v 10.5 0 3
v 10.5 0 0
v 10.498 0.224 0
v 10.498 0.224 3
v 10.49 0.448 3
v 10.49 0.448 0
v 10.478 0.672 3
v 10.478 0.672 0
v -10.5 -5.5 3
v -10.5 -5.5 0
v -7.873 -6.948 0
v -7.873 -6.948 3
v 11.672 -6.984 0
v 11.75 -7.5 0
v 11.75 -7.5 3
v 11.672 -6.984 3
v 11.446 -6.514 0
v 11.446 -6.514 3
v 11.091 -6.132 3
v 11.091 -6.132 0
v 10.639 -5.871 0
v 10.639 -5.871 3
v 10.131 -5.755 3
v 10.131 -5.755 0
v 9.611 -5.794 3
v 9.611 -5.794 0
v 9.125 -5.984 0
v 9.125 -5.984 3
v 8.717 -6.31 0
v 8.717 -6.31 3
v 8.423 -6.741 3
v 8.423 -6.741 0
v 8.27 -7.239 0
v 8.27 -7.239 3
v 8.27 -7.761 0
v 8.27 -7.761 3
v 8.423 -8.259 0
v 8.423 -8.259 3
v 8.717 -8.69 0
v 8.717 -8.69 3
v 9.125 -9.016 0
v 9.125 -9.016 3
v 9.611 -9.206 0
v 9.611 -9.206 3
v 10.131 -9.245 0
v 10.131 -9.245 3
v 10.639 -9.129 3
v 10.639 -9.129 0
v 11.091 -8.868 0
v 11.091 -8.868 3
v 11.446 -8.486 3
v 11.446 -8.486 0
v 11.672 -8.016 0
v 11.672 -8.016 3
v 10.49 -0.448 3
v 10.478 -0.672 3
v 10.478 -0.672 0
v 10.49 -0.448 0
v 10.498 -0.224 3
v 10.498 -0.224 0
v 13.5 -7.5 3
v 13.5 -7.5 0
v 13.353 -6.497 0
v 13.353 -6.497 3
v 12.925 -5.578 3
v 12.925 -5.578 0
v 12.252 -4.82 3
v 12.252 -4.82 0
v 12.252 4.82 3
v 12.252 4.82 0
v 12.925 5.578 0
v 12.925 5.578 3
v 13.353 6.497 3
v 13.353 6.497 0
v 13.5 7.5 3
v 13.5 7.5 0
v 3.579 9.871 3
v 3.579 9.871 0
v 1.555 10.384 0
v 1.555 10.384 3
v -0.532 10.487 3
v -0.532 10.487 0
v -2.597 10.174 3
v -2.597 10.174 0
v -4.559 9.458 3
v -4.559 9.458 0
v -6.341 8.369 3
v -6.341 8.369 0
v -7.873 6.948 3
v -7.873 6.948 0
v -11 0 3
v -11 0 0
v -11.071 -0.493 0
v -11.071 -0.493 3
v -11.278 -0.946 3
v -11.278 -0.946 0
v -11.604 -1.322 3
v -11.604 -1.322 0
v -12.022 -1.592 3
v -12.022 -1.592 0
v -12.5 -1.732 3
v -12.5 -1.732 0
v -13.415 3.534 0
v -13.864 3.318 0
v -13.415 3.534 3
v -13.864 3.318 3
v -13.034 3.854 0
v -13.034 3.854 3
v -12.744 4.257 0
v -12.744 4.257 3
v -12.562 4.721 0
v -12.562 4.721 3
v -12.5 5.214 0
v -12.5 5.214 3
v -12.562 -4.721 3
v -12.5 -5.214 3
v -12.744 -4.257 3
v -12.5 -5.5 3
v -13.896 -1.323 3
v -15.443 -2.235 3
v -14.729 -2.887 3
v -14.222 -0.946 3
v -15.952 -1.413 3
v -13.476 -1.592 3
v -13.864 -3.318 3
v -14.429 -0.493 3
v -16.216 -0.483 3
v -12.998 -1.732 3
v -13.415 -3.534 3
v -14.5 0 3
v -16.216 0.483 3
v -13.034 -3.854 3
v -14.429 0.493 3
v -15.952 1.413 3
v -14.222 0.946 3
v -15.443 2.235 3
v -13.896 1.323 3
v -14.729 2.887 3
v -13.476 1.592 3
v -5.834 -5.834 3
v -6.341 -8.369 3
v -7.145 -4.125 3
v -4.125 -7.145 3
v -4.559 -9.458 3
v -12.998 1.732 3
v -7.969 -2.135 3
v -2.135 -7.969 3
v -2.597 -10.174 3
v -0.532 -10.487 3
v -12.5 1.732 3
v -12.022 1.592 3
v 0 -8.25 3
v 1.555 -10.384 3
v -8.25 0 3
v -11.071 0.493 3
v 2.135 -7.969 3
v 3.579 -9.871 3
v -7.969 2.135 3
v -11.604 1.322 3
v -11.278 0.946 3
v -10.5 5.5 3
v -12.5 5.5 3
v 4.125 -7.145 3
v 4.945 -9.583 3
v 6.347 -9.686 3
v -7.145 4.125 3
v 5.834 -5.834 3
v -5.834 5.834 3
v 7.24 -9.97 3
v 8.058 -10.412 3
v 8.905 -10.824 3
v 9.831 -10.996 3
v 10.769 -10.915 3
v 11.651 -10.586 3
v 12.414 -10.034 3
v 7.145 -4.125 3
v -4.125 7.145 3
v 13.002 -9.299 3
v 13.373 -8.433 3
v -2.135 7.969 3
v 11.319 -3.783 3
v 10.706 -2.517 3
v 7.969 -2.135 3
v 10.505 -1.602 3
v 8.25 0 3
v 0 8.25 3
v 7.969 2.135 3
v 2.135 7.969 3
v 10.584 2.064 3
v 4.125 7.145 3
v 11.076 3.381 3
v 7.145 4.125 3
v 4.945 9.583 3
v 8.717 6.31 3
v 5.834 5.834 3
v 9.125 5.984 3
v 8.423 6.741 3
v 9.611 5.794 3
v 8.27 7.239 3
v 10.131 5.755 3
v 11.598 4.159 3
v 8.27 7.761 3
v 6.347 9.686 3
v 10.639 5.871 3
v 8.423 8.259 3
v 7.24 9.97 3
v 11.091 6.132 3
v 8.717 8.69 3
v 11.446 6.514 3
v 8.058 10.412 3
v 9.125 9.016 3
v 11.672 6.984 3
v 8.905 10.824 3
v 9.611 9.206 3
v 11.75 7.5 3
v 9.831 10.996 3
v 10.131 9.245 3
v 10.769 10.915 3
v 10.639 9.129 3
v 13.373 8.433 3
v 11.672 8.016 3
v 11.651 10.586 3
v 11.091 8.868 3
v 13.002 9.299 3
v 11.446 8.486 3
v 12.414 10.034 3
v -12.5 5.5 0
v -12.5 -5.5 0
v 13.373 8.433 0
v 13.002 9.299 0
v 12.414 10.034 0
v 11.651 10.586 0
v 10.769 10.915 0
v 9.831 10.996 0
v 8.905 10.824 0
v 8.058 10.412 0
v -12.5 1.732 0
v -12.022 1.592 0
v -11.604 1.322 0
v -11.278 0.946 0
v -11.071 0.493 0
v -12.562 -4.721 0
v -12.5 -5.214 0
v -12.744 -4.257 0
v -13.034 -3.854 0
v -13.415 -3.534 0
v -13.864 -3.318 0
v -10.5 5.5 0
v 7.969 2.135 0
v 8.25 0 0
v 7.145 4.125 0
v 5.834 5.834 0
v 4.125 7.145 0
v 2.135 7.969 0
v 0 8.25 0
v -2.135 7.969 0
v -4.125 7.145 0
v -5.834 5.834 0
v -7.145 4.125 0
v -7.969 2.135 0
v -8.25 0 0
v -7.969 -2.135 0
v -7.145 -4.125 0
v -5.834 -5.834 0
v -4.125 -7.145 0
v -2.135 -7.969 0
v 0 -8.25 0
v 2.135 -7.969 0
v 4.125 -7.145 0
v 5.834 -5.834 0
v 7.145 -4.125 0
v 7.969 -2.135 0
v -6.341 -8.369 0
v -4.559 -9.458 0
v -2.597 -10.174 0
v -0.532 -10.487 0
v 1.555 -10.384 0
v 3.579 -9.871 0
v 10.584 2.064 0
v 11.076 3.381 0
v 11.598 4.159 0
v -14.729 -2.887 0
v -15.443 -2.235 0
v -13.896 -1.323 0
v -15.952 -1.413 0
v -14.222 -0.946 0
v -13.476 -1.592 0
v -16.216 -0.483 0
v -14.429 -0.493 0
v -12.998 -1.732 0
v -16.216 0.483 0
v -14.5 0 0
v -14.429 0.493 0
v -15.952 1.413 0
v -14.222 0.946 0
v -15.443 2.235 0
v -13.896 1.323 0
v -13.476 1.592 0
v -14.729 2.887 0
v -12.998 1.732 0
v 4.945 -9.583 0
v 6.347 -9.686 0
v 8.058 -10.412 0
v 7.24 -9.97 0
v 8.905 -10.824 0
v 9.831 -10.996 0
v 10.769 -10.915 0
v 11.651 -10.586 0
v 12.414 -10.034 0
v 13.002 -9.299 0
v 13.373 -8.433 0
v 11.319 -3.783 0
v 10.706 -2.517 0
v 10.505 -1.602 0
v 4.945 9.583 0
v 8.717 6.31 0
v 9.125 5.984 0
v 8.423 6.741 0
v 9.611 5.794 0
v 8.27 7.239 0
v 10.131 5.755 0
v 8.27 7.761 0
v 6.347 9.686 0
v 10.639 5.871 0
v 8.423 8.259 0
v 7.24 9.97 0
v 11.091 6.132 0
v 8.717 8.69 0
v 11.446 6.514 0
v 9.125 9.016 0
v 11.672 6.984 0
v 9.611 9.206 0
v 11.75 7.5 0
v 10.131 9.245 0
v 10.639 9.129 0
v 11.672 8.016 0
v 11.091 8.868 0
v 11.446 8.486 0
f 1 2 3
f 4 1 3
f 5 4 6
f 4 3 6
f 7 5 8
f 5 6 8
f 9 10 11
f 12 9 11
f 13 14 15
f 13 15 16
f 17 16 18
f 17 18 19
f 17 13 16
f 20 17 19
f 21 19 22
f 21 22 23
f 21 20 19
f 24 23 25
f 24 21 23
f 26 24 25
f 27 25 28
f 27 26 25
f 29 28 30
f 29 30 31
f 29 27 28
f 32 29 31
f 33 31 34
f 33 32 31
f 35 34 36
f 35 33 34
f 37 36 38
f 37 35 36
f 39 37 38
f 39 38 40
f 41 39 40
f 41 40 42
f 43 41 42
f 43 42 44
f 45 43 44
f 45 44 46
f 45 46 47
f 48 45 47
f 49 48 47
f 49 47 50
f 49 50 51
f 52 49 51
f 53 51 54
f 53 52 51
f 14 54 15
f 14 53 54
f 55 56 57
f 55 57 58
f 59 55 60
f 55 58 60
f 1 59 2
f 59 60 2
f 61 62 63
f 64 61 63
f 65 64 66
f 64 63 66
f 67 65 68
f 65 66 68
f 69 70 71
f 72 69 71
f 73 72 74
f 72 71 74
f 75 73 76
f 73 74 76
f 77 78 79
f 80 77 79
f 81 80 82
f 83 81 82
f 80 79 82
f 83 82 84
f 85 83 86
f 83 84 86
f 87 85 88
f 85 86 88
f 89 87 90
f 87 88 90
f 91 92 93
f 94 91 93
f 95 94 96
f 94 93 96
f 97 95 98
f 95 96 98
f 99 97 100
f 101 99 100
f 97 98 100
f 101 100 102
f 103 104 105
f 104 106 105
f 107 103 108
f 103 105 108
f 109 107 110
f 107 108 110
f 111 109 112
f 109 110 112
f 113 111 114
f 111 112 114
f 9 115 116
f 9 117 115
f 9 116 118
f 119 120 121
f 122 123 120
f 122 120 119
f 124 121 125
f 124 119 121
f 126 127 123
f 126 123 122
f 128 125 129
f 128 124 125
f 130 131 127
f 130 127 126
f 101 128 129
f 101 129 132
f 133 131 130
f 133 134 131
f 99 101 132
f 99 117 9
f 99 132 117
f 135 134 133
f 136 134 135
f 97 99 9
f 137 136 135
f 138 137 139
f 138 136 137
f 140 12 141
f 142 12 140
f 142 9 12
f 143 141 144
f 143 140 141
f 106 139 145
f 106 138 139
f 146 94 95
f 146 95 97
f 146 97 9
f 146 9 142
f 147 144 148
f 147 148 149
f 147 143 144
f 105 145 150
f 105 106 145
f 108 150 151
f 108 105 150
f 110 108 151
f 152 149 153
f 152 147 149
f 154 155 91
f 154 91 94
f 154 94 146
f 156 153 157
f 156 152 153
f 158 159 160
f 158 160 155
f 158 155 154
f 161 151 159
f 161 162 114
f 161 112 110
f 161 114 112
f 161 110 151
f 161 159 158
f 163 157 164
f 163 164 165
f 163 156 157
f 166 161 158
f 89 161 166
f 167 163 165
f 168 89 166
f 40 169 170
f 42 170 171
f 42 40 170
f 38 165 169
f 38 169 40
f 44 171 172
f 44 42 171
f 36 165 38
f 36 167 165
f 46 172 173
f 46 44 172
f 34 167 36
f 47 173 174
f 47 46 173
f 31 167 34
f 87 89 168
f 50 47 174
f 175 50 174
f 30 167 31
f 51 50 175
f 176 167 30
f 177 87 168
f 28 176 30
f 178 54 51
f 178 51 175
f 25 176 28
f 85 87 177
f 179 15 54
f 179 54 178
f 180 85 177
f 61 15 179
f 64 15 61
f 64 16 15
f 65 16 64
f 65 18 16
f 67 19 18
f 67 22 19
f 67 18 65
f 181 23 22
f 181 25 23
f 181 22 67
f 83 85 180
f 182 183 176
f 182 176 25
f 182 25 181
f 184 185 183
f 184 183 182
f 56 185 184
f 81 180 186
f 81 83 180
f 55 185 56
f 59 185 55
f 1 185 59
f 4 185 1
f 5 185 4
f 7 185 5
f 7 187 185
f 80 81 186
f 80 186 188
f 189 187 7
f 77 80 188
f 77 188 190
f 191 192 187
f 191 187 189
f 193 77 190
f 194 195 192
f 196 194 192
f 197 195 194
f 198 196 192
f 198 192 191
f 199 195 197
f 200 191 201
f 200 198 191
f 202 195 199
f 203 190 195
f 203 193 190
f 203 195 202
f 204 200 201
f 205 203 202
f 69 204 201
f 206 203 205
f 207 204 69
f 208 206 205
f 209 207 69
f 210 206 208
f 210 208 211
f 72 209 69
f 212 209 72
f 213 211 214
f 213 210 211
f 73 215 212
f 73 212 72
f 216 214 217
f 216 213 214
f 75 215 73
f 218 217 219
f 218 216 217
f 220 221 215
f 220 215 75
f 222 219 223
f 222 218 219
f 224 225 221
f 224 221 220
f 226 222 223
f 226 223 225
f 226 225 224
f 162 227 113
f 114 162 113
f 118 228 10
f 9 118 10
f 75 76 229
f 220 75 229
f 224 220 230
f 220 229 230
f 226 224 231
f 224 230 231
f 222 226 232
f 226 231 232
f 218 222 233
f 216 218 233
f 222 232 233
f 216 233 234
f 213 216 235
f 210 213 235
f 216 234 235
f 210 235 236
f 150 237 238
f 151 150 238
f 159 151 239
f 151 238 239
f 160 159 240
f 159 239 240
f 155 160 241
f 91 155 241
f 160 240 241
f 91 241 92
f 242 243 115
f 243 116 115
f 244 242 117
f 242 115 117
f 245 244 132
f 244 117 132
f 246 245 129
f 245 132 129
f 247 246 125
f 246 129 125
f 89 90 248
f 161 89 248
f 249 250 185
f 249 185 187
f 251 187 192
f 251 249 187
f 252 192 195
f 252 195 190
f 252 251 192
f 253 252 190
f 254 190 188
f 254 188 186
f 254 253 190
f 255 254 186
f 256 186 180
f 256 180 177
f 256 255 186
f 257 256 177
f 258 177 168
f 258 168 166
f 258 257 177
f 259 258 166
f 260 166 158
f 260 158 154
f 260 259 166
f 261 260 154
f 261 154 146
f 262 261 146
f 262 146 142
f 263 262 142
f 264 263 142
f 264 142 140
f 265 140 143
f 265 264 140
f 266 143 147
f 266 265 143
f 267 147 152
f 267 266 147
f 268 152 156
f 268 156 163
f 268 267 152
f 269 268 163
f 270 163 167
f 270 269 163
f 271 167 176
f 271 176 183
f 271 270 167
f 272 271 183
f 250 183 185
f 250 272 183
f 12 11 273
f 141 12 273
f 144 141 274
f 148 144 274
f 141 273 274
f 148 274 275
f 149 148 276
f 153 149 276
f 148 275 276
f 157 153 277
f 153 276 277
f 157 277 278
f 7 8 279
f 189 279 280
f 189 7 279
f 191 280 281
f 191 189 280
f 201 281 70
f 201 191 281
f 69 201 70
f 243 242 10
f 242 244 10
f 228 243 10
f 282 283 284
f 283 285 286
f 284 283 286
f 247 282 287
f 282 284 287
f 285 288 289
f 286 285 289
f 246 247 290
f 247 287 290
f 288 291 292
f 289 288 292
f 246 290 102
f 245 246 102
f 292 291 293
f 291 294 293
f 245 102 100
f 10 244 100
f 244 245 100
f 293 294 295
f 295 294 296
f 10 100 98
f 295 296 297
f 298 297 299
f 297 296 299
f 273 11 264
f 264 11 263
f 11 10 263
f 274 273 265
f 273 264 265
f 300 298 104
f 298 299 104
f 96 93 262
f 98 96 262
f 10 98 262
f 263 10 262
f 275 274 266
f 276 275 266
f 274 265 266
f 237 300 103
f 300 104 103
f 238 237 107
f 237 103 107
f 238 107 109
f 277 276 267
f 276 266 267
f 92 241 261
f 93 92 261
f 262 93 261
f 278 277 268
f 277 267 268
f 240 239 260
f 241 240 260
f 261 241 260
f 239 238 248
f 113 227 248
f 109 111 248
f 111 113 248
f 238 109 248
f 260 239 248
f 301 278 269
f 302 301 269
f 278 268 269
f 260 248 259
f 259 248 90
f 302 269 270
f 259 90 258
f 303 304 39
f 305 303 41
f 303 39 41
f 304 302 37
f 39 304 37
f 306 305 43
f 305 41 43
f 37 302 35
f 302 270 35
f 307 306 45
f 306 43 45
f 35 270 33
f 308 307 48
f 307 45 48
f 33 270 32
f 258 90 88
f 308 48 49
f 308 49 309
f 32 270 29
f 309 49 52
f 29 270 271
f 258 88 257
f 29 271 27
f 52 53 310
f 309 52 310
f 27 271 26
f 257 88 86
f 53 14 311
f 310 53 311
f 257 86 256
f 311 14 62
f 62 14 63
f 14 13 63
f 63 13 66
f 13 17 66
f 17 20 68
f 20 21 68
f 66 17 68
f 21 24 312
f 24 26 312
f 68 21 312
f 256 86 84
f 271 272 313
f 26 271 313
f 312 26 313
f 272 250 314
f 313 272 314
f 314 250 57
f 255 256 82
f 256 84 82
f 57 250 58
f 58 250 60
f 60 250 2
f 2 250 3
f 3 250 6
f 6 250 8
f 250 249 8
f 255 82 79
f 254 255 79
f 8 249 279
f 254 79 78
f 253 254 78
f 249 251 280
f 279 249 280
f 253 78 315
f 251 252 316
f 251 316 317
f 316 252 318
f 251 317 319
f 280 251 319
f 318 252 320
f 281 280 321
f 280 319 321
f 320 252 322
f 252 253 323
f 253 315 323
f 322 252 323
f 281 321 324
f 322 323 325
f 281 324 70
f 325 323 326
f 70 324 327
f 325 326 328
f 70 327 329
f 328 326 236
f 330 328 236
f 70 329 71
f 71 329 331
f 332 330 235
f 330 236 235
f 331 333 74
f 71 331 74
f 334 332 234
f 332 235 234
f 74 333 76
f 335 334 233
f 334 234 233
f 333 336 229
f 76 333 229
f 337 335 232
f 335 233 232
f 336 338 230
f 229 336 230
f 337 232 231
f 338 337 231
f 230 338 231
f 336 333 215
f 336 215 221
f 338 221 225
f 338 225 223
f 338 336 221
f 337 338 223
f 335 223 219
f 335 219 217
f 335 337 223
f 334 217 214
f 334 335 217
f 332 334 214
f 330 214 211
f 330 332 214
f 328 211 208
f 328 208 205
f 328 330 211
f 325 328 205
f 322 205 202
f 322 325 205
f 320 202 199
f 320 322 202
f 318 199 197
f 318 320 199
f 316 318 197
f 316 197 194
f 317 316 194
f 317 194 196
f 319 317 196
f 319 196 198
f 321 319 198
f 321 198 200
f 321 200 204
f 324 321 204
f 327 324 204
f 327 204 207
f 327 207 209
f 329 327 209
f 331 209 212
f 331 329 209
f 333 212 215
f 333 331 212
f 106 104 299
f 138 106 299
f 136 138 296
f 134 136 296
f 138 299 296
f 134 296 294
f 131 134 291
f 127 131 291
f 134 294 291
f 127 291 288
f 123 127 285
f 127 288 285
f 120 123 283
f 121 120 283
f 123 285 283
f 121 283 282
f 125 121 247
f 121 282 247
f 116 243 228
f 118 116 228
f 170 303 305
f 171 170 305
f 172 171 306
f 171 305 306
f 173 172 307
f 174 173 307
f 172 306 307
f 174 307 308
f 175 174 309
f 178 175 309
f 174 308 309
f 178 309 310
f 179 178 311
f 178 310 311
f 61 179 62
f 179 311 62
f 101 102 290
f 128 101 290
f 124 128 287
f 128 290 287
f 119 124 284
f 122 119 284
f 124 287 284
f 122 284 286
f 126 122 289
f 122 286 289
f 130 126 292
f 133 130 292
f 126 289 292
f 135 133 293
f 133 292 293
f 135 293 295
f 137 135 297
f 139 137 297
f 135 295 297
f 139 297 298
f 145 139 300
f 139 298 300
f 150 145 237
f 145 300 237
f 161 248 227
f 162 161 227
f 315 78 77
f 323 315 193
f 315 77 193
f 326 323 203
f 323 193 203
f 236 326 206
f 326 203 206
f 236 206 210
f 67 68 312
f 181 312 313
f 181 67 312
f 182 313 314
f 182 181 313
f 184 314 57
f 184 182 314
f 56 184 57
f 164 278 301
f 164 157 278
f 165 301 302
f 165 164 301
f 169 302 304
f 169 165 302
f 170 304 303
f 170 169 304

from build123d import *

# Parameters (mm, degrees)
F0_R     = 8.25
F0_R_2   = 1.75
F1_DEPTH = 3
F2_R     = 2
F3_R     = 5


# Not quite as in the source:
# - a feature names something its author has since deleted; it is built from what else it names


with BuildPart() as f1:
    # F0 (on Top) → F1 (new body)
    with BuildSketch(Plane.XY):
        with BuildLine():
            Line((-10.5, -2.6809513237), (-10.5, 0))
            Line((-10.5, 0), (-10.5, 2.6809513237))
            ThreePointArc((-10.5, 2.6809513237), (-11.4360102659, 3.243983813), (-12.5, 3.4910600109))
            Line((-12.5, 3.4910600109), (-12.5, 1.7320508076))
            ThreePointArc((-12.5, 1.7320508076), (-11.4271243445, 1.1456439237), (-11, 0))
            ThreePointArc((-11, 0), (-11.4271243445, -1.1456439237), (-12.5, -1.7320508076))
            Line((-12.5, -1.7320508076), (-12.5, -3.4910600109))
            ThreePointArc((-12.5, -3.4910600109), (-11.4360102659, -3.243983813), (-10.5, -2.6809513237))
        make_face()
        with BuildLine():
            Line((-12.5, 1.7320508076), (-12.5, 3.4910600109))
            ThreePointArc((-12.5, 3.4910600109), (-16.25, 0), (-12.5, -3.4910600109))
            Line((-12.5, -3.4910600109), (-12.5, -1.7320508076))
            ThreePointArc((-12.5, -1.7320508076), (-14.5, 0), (-12.5, 1.7320508076))
        make_face()
        with BuildLine():
            Line((-10.5, 2.6809513237), (-10.5, 5.5))
            Line((-10.5, 5.5), (-12.5, 5.5))
            Line((-12.5, 5.5), (-12.5, 3.4910600109))
            ThreePointArc((-12.5, 3.4910600109), (-11.4360102659, 3.243983813), (-10.5, 2.6809513237))
        make_face()
        with BuildLine():
            ThreePointArc((-10.2181372549, 2.4165411314), (-9.3247712996, 4.8268665001), (-7.8725304742, 6.9478963675))
            Line((-7.8725304742, 6.9478963675), (-10.5, 5.5))
            Line((-10.5, 5.5), (-10.5, 2.6809513237))
            ThreePointArc((-10.5, 2.6809513237), (-10.3554163168, 2.5526396111), (-10.2181372549, 2.4165411314))
        make_face()
        with BuildLine():
            Line((-7.2260237528, 5.7746931281), (-7.8725304742, 6.9478963675))
            ThreePointArc((-7.8725304742, 6.9478963675), (-9.3247712996, 4.8268665001), (-10.2181372549, 2.4165411314))
            ThreePointArc((-10.2181372549, 2.4165411314), (-9.5010371187, 1.301629823), (-9.25, 0))
            ThreePointArc((-9.25, 0), (-8.729353347, 3.0595571809), (-7.2260237528, 5.7746931281))
        make_face()
        with BuildLine():
            ThreePointArc((6.6767394005, 6.401847466), (6.5063300085, 7.2895956499), (6.5689658587, 8.1913788551))
            ThreePointArc((6.5689658587, 8.1913788551), (-0.9007676454, 10.4612913949), (-7.8725304742, 6.9478963675))
            Line((-7.8725304742, 6.9478963675), (-7.2260237528, 5.7746931281))
            ThreePointArc((-7.2260237528, 5.7746931281), (-0.4168440545, 9.2406028502), (6.6767394005, 6.401847466))
        make_face()
        with BuildLine():
            ThreePointArc((9.25, 0), (8.9359851316, 2.3897007611), (8.0152605995, 4.617152534))
            ThreePointArc((8.0152605995, 4.617152534), (7.2, 5.4), (6.6767394005, 6.401847466))
            ThreePointArc((6.6767394005, 6.401847466), (-0.4168440545, 9.2406028502), (-7.2260237528, 5.7746931281))
            ThreePointArc((-7.2260237528, 5.7746931281), (-8.729353347, 3.0595571809), (-9.25, 0))
            ThreePointArc((-9.25, 0), (-8.729353347, -3.0595571809), (-7.2260237528, -5.7746931281))
            ThreePointArc((-7.2260237528, -5.7746931281), (-0.4168440545, -9.2406028502), (6.6767394005, -6.401847466))
            ThreePointArc((6.6767394005, -6.401847466), (7.2, -5.4), (8.0152605995, -4.617152534))
            ThreePointArc((8.0152605995, -4.617152534), (8.9359851316, -2.3897007611), (9.25, 0))
        make_face()
        Circle(F0_R, mode=Mode.SUBTRACT)
        with BuildLine():
            Line((-12.5, -5.5), (-10.5, -5.5))
            Line((-10.5, -5.5), (-10.5, -2.6809513237))
            ThreePointArc((-10.5, -2.6809513237), (-11.4360102659, -3.243983813), (-12.5, -3.4910600109))
            Line((-12.5, -3.4910600109), (-12.5, -5.5))
        make_face()
        with BuildLine():
            Line((-10.5, -5.5), (-7.8725304742, -6.9478963675))
            ThreePointArc((-7.8725304742, -6.9478963675), (-9.3247712996, -4.8268665001), (-10.2181372549, -2.4165411314))
            ThreePointArc((-10.2181372549, -2.4165411314), (-10.3554163168, -2.5526396111), (-10.5, -2.6809513237))
            Line((-10.5, -2.6809513237), (-10.5, -5.5))
        make_face()
        with BuildLine():
            ThreePointArc((-10.5, -2.6809513237), (-10.3554163168, -2.5526396111), (-10.2181372549, -2.4165411314))
            ThreePointArc((-10.2181372549, -2.4165411314), (-10.4292962652, -1.2164618415), (-10.5, 0))
            Line((-10.5, 0), (-10.5, -2.6809513237))
        make_face()
        with BuildLine():
            ThreePointArc((-9.25, 0), (-9.5010371187, 1.301629823), (-10.2181372549, 2.4165411314))
            ThreePointArc((-10.2181372549, 2.4165411314), (-10.4292962652, 1.2164618415), (-10.5, 0))
            ThreePointArc((-10.5, 0), (-10.4292962652, -1.2164618415), (-10.2181372549, -2.4165411314))
            ThreePointArc((-10.2181372549, -2.4165411314), (-9.5010371187, -1.301629823), (-9.25, 0))
        make_face()
        with BuildLine():
            ThreePointArc((-10.2181372549, -2.4165411314), (-9.3247712996, -4.8268665001), (-7.8725304742, -6.9478963675))
            Line((-7.8725304742, -6.9478963675), (-7.2260237528, -5.7746931281))
            ThreePointArc((-7.2260237528, -5.7746931281), (-8.729353347, -3.0595571809), (-9.25, 0))
            ThreePointArc((-9.25, 0), (-9.5010371187, -1.301629823), (-10.2181372549, -2.4165411314))
        make_face()
        with BuildLine():
            ThreePointArc((-10.5, 0), (-10.4292962652, 1.2164618415), (-10.2181372549, 2.4165411314))
            ThreePointArc((-10.2181372549, 2.4165411314), (-10.3554163168, 2.5526396111), (-10.5, 2.6809513237))
            Line((-10.5, 2.6809513237), (-10.5, 0))
        make_face()
        with BuildLine():
            ThreePointArc((-7.8725304742, -6.9478963675), (-0.9007676454, -10.4612913949), (6.5689658587, -8.1913788551))
            ThreePointArc((6.5689658587, -8.1913788551), (6.5063300085, -7.2895956499), (6.6767394005, -6.401847466))
            ThreePointArc((6.6767394005, -6.401847466), (-0.4168440545, -9.2406028502), (-7.2260237528, -5.7746931281))
            Line((-7.2260237528, -5.7746931281), (-7.8725304742, -6.9478963675))
        make_face()
        with BuildLine():
            ThreePointArc((6.5689658587, -8.1913788551), (8.4, -6.3), (9.7030341413, -4.0126211449))
            ThreePointArc((9.7030341413, -4.0126211449), (8.8197842263, -4.2049900262), (8.0152605995, -4.617152534))
            ThreePointArc((8.0152605995, -4.617152534), (7.4, -5.55), (6.6767394005, -6.401847466))
            ThreePointArc((6.6767394005, -6.401847466), (6.5063300085, -7.2895956499), (6.5689658587, -8.1913788551))
        make_face()
        with BuildLine():
            ThreePointArc((13.5, -7.5), (12.3675535363, -4.9222703298), (9.7030341413, -4.0126211449))
            ThreePointArc((9.7030341413, -4.0126211449), (8.4, -6.3), (6.5689658587, -8.1913788551))
            ThreePointArc((6.5689658587, -8.1913788551), (10.3474050269, -10.982715858), (13.5, -7.5))
        make_face()
        with Locations((10, -7.5)):
            Circle(F0_R_2, mode=Mode.SUBTRACT)
        with BuildLine():
            ThreePointArc((6.6767394005, -6.401847466), (7.4, -5.55), (8.0152605995, -4.617152534))
            ThreePointArc((8.0152605995, -4.617152534), (7.2, -5.4), (6.6767394005, -6.401847466))
        make_face()
        with BuildLine():
            ThreePointArc((9.7030341413, -4.0126211449), (10.2988314503, -2.0455001242), (10.5, 0))
            ThreePointArc((10.5, 0), (10.2988314503, 2.0455001242), (9.7030341413, 4.0126211449))
            ThreePointArc((9.7030341413, 4.0126211449), (8.8197842263, 4.2049900262), (8.0152605995, 4.617152534))
            ThreePointArc((8.0152605995, 4.617152534), (8.9359851316, 2.3897007611), (9.25, 0))
            ThreePointArc((9.25, 0), (8.9359851316, -2.3897007611), (8.0152605995, -4.617152534))
            ThreePointArc((8.0152605995, -4.617152534), (8.8197842263, -4.2049900262), (9.7030341413, -4.0126211449))
        make_face()
        with BuildLine():
            ThreePointArc((6.6767394005, 6.401847466), (7.2, 5.4), (8.0152605995, 4.617152534))
            ThreePointArc((8.0152605995, 4.617152534), (7.4, 5.55), (6.6767394005, 6.401847466))
        make_face()
        with BuildLine():
            ThreePointArc((8.0152605995, 4.617152534), (8.8197842263, 4.2049900262), (9.7030341413, 4.0126211449))
            ThreePointArc((9.7030341413, 4.0126211449), (8.4, 6.3), (6.5689658587, 8.1913788551))
            ThreePointArc((6.5689658587, 8.1913788551), (6.5063300085, 7.2895956499), (6.6767394005, 6.401847466))
            ThreePointArc((6.6767394005, 6.401847466), (7.4, 5.55), (8.0152605995, 4.617152534))
        make_face()
        with BuildLine():
            ThreePointArc((6.5689658587, 8.1913788551), (8.4, 6.3), (9.7030341413, 4.0126211449))
            ThreePointArc((9.7030341413, 4.0126211449), (12.3675535363, 4.9222703298), (13.5, 7.5))
            ThreePointArc((13.5, 7.5), (10.3474050269, 10.982715858), (6.5689658587, 8.1913788551))
        make_face()
        with Locations((10, 7.5)):
            Circle(F0_R_2, mode=Mode.SUBTRACT)
    extrude(amount=F1_DEPTH)

    # F2
    f2_edges = [f1.edges().sort_by_distance(p)[0] for p in [
        (-12.5, -3.49106, 1.5),
        (-12.5, 3.49106, 1.5),
    ]]
    fillet(f2_edges, radius=F2_R)

    # F3
    f3_edges = [f1.edges().sort_by_distance(p)[0] for p in [
        (6.568966, -8.191379, 1.5),
        (9.703034, -4.012621, 1.5),
        (9.703034, 4.012621, 1.5),
        (6.568966, 8.191379, 1.5),
    ]]
    fillet(f3_edges, radius=F3_R)


solid = f1.part
